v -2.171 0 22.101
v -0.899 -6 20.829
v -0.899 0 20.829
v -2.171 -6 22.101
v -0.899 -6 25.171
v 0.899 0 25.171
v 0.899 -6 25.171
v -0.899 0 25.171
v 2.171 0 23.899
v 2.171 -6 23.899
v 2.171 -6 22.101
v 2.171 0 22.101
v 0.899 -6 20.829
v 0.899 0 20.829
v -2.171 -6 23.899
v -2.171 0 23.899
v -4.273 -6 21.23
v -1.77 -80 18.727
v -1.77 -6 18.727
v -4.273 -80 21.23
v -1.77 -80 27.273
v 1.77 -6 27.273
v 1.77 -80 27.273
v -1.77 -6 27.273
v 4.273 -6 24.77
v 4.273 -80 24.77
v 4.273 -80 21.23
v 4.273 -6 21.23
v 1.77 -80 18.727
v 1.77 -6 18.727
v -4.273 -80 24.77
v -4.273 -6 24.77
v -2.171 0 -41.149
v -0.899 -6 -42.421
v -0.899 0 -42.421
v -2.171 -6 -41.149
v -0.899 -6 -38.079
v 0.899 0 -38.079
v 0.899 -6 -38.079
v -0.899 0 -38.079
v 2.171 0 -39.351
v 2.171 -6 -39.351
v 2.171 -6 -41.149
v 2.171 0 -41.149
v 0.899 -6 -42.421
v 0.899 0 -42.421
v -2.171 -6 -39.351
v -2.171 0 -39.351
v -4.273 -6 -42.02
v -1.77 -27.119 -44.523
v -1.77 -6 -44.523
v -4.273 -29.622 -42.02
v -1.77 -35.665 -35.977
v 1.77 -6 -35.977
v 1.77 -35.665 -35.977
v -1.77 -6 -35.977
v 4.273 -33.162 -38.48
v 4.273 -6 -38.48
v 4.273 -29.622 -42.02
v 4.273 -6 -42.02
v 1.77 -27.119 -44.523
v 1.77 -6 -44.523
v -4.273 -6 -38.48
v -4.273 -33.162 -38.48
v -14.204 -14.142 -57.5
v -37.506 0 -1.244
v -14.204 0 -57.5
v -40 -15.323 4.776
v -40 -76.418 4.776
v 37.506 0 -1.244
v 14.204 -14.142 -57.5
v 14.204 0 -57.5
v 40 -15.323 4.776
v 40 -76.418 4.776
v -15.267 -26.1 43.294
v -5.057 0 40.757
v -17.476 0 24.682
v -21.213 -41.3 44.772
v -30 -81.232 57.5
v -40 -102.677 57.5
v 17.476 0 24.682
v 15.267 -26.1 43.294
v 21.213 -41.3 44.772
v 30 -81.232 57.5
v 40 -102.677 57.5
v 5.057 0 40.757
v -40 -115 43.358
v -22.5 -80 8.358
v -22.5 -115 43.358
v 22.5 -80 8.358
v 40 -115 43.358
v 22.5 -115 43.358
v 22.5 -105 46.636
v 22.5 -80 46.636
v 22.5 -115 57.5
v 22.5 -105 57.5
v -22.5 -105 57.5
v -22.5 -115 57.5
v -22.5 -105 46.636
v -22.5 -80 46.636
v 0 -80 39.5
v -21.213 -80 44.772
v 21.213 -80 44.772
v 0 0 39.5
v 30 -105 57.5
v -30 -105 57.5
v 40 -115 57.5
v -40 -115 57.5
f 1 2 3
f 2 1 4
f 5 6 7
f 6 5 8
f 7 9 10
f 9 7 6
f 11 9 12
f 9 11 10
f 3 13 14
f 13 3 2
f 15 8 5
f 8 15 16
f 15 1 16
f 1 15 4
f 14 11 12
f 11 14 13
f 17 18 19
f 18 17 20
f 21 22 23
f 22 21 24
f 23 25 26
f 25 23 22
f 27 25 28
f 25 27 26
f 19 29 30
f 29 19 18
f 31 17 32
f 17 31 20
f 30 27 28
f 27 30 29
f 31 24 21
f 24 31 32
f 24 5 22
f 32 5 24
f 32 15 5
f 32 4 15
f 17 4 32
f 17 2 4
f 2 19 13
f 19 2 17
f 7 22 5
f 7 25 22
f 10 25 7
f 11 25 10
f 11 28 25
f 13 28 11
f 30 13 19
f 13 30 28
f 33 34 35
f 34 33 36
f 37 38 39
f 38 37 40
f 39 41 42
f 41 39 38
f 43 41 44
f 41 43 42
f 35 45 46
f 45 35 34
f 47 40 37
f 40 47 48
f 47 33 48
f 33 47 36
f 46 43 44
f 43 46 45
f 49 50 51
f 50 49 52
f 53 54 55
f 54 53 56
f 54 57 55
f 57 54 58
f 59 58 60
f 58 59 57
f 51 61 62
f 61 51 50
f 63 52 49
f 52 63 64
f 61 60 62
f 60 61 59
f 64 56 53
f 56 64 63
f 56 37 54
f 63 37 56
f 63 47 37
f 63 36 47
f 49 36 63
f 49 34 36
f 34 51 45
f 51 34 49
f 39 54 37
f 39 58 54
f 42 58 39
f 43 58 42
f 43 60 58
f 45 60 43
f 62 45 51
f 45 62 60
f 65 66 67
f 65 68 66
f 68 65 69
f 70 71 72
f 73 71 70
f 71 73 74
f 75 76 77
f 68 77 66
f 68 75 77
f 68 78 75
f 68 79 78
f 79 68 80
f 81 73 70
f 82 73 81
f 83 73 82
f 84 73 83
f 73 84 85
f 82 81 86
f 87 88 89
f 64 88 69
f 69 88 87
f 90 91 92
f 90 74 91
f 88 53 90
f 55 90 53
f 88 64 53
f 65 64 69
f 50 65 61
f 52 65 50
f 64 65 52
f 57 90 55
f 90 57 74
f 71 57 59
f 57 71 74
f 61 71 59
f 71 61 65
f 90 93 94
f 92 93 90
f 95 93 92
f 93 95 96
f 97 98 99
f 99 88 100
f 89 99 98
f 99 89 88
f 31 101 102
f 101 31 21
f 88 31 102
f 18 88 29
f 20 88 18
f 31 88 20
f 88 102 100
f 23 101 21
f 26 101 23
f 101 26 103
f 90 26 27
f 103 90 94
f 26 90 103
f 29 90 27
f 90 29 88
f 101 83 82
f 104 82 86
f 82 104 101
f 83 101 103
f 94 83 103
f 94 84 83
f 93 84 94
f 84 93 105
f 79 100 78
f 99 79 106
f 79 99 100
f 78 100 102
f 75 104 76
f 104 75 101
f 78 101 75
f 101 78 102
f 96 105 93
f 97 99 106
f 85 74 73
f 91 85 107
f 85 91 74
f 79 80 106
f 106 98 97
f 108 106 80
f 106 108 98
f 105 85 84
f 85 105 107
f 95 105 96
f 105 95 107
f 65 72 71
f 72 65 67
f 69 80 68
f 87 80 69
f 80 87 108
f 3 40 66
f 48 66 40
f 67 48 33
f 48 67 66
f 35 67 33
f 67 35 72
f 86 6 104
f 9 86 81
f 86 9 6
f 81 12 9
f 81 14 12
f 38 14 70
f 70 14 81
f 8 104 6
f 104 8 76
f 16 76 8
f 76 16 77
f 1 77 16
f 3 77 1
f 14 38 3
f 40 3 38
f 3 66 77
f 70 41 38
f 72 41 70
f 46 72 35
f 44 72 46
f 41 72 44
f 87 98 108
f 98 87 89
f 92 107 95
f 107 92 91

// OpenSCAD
top = 1;
bottom = -1;
left = -1;
right = 1;
front = -1;
rear = 1;

neck_width     = 45;
head_width     = 60;
head_thickness = 25;

plate_thickness = 6;

dist_from_wall = 80;

screw_diam = 4.7;
screw_head_diam = 9.25;

hook_material_thickness = 10;
total_depth = dist_from_wall + head_thickness + hook_material_thickness;
total_width = head_width + hook_material_thickness*2;

module main() {
  module body() {
    translate([0,total_depth/2*front,0])
      cube([total_width,total_depth,total_depth],center=true);
  }

  //% rotate([-45,0,0])
  //  translate([0,total_depth*.4*front,total_depth*.45*bottom])
  //    cube([200,200,2],center=true);

  module holes() {
    // main angle
    translate([0,total_depth/2*front,0])
      rotate([-45,0,0])
        translate([0,0,total_depth/2*bottom-hook_material_thickness])
          cube([total_width+1,total_depth*2,total_depth],center=true);

    // neck space
    translate([0,(dist_from_wall+head_thickness)*front,0])
      cube([neck_width,head_thickness*2,total_depth+1],center=true);

    // retainer
    translate([0,0,total_depth/2])
      scale([1,1,.6])
        rotate([90,0,0]) rotate([0,0,0])
          cylinder(r=head_width/2,h=(dist_from_wall+head_thickness)*2,center=true,$fn=8);

    // screw holes
    for(end=[total_depth*.2,total_depth*.35*bottom]) {
      translate([0,0,end])
        rotate([90,0,0])
          translate([0,0,total_depth/2]) {
            rotate([0,0,22.5])
              cylinder(r=screw_diam/2,h=total_depth+1,center=true,$fn=8);

            translate([0,0,plate_thickness]) rotate([0,0,22.5])
              cylinder(r=screw_head_diam/2,h=total_depth,center=true,$fn=8);
          }
    }

    // cubby hole
    /*
    translate([0,0,-5])
      scale([1,1,.5])
        rotate([90,0,0]) rotate([0,0,22.5])
            cylinder(r=neck_width/2,h=total_depth*2,center=true,$fn=8);
    */

    // bottom angle
    for (side=[left,right]) {
      translate([total_depth/2*side,0,total_depth/2*bottom])
        rotate([0,22.5*side,0])
          cube([total_width,total_depth*2,total_depth*2],center=true);
    }

    // top angle
    for (side=[left,right]) {
      translate([total_depth*.4*side,0,total_depth/2])
        rotate([0,-35*side,25*side])
          cube([total_width,total_depth*2,total_depth*2],center=true);
    }
  }

  difference() {
    body();
    holes();
  }
}

module to_print() {
  dist = sqrt(pow(total_depth/2+hook_material_thickness*1.5,2)*2)/2;
  rotate([0,0,-45])
    translate([0,0,dist])
      rotate([45,0,0])
        main();

  % translate([40*left,40*front,0])
    cube([200,200,1],center=true);
}

main();
//to_print();
